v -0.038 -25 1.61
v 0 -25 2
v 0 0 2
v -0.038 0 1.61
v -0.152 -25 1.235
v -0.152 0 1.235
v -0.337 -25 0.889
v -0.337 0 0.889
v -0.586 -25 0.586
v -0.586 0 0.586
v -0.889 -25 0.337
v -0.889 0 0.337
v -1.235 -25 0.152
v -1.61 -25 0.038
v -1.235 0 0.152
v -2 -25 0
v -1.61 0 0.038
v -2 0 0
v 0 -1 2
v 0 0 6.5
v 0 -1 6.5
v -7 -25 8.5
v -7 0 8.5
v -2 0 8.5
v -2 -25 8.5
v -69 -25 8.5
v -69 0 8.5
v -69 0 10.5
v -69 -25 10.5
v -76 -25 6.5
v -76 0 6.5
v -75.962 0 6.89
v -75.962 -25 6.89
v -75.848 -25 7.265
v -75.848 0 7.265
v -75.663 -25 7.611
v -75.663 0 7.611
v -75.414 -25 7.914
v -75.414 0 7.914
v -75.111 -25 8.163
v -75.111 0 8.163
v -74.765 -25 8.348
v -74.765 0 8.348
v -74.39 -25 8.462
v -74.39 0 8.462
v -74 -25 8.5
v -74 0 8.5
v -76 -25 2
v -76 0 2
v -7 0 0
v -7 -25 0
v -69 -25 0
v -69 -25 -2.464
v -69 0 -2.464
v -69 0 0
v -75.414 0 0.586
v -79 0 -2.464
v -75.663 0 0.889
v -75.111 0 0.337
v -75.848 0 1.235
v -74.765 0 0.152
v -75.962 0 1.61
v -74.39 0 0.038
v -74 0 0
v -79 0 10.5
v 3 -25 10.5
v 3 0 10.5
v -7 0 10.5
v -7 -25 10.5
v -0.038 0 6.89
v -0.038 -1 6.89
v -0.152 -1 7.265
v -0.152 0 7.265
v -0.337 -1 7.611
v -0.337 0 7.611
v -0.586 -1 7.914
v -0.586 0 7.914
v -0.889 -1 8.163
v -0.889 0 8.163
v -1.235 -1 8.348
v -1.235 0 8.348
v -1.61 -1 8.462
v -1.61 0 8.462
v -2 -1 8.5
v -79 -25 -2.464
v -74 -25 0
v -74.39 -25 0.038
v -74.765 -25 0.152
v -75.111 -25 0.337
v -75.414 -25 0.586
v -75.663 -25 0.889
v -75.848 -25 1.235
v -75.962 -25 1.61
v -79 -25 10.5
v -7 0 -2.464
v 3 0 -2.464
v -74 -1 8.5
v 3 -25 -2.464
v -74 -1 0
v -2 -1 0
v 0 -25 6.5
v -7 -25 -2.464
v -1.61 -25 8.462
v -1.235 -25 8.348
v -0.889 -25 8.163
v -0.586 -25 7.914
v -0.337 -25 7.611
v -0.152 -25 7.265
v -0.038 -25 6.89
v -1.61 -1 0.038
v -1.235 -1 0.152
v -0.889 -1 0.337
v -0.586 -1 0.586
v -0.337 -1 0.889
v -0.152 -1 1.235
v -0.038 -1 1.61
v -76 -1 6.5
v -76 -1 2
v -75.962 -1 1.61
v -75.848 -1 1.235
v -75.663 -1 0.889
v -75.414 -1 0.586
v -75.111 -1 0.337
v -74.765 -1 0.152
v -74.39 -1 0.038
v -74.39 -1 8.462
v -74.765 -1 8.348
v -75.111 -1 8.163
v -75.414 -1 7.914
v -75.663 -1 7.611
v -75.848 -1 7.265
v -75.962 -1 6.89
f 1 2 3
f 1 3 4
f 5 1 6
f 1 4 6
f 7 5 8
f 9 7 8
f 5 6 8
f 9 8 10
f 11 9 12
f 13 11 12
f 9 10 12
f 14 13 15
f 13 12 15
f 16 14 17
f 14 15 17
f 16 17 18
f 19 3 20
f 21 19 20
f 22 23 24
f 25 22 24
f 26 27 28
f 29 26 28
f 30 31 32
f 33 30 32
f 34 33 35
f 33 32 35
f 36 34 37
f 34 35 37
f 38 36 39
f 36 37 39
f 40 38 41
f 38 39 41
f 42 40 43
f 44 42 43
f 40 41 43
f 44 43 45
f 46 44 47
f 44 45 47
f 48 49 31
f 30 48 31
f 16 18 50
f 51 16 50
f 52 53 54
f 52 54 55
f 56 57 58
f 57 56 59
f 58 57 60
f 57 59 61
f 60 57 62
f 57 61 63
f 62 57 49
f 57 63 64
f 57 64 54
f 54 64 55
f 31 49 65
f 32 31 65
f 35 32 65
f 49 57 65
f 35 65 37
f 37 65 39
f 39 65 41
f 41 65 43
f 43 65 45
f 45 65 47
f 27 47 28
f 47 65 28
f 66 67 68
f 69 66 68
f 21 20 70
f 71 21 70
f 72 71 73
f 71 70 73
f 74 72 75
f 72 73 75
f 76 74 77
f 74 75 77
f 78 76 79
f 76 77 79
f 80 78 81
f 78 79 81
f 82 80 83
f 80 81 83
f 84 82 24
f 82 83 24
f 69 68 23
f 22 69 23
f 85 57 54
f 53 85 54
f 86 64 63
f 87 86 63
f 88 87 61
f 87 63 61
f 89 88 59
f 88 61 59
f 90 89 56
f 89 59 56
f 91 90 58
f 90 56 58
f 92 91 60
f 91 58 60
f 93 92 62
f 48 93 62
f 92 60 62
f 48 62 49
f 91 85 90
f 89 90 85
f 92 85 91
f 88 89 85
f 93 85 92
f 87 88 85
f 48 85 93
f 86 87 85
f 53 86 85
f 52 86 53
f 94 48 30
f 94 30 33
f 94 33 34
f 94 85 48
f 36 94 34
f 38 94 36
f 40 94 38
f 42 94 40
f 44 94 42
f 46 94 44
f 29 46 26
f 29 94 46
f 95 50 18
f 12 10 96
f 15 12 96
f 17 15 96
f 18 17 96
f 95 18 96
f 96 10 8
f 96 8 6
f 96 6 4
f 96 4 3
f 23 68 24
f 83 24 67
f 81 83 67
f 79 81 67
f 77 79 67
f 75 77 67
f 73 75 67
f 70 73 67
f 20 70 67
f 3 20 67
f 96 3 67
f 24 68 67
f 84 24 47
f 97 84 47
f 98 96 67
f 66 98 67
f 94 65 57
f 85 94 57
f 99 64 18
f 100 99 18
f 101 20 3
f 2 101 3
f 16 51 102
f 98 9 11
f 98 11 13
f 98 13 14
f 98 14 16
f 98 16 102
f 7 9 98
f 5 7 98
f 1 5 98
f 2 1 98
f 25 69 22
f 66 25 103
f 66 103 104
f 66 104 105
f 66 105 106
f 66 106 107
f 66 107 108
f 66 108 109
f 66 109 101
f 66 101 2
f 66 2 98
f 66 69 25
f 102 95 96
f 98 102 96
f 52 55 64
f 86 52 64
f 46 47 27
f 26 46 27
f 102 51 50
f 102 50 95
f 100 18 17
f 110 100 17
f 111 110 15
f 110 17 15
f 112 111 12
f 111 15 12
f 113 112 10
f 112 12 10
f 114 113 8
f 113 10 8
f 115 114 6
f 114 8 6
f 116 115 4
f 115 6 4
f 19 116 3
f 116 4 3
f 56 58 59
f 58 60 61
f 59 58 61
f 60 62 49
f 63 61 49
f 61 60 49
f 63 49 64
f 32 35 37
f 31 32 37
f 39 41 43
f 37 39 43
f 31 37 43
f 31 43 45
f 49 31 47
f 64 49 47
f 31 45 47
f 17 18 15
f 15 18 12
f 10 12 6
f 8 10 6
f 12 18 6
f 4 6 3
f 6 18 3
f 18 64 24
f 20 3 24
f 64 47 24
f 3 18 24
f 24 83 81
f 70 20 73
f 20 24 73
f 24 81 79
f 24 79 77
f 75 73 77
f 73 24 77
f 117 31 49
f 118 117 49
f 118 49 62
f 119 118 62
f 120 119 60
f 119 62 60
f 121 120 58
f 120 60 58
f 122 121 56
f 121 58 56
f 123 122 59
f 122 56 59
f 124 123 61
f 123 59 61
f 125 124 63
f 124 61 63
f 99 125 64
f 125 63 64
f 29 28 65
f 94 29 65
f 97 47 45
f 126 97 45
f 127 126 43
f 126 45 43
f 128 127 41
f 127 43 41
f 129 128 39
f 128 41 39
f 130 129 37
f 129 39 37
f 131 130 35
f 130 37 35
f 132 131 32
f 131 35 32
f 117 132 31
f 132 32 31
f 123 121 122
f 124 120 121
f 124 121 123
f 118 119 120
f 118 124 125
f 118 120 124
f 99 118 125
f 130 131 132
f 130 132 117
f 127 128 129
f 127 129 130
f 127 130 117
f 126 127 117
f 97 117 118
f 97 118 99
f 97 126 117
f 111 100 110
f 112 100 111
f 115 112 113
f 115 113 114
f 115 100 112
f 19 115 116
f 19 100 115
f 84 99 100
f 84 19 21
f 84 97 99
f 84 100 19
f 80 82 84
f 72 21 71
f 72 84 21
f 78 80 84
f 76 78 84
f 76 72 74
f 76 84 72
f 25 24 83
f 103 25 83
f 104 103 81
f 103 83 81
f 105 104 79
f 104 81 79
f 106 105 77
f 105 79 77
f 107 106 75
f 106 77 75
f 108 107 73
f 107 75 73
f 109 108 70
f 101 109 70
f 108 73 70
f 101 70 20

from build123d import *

# Parameters (mm, degrees)
F1_DEPTH = 25
F2_DEPTH = 1


with BuildPart() as f1:
    # F0 (on Front) → F1 (new body)
    with BuildSketch(Plane.XZ):
        with BuildLine():
            Line((-69, -2.463747), (-69, 0))
            Line((-69, 0), (-74, 0))
            ThreePointArc((-74, 0), (-75.414214, 0.585786), (-76, 2))
            Line((-76, 2), (-76, 6.5))
            ThreePointArc((-76, 6.5), (-75.414214, 7.914214), (-74, 8.5))
            Line((-74, 8.5), (-69, 8.5))
            Line((-69, 8.5), (-69, 10.5))
            Line((-69, 10.5), (-79, 10.5))
            Line((-79, 10.5), (-79, -2.463747))
            Line((-79, -2.463747), (-69, -2.463747))
        make_face()
        with BuildLine():
            Line((-2, 0), (-7, 0))
            Line((-7, 0), (-7, -2.463747))
            Line((-7, -2.463747), (3, -2.463747))
            Line((3, -2.463747), (3, 10.5))
            Line((3, 10.5), (-7, 10.5))
            Line((-7, 10.5), (-7, 8.5))
            Line((-7, 8.5), (-2, 8.5))
            ThreePointArc((-2, 8.5), (-0.585786, 7.914214), (0, 6.5))
            Line((0, 6.5), (0, 2))
            ThreePointArc((0, 2), (-0.585786, 0.585786), (-2, 0))
        make_face()
    extrude(amount=F1_DEPTH)


with BuildPart() as f2:
    # F0 (on Front) → F2 (new body)
    with BuildSketch(Plane.XZ):
        with BuildLine():
            Line((-69, 0), (-38, 0))
            Line((-38, 0), (-38, 8.5))
            Line((-38, 8.5), (-69, 8.5))
            Line((-69, 8.5), (-74, 8.5))
            ThreePointArc((-74, 8.5), (-75.414214, 7.914214), (-76, 6.5))
            Line((-76, 6.5), (-76, 2))
            ThreePointArc((-76, 2), (-75.414214, 0.585786), (-74, 0))
            Line((-74, 0), (-69, 0))
        make_face()
        with BuildLine():
            Line((-38, 8.5), (-38, 0))
            Line((-38, 0), (-7, 0))
            Line((-7, 0), (-2, 0))
            ThreePointArc((-2, 0), (-0.585786, 0.585786), (0, 2))
            Line((0, 2), (0, 6.5))
            ThreePointArc((0, 6.5), (-0.585786, 7.914214), (-2, 8.5))
            Line((-2, 8.5), (-7, 8.5))
            Line((-7, 8.5), (-38, 8.5))
        make_face()
    extrude(amount=F2_DEPTH)


solid = Compound([f1.part, f2.part])
